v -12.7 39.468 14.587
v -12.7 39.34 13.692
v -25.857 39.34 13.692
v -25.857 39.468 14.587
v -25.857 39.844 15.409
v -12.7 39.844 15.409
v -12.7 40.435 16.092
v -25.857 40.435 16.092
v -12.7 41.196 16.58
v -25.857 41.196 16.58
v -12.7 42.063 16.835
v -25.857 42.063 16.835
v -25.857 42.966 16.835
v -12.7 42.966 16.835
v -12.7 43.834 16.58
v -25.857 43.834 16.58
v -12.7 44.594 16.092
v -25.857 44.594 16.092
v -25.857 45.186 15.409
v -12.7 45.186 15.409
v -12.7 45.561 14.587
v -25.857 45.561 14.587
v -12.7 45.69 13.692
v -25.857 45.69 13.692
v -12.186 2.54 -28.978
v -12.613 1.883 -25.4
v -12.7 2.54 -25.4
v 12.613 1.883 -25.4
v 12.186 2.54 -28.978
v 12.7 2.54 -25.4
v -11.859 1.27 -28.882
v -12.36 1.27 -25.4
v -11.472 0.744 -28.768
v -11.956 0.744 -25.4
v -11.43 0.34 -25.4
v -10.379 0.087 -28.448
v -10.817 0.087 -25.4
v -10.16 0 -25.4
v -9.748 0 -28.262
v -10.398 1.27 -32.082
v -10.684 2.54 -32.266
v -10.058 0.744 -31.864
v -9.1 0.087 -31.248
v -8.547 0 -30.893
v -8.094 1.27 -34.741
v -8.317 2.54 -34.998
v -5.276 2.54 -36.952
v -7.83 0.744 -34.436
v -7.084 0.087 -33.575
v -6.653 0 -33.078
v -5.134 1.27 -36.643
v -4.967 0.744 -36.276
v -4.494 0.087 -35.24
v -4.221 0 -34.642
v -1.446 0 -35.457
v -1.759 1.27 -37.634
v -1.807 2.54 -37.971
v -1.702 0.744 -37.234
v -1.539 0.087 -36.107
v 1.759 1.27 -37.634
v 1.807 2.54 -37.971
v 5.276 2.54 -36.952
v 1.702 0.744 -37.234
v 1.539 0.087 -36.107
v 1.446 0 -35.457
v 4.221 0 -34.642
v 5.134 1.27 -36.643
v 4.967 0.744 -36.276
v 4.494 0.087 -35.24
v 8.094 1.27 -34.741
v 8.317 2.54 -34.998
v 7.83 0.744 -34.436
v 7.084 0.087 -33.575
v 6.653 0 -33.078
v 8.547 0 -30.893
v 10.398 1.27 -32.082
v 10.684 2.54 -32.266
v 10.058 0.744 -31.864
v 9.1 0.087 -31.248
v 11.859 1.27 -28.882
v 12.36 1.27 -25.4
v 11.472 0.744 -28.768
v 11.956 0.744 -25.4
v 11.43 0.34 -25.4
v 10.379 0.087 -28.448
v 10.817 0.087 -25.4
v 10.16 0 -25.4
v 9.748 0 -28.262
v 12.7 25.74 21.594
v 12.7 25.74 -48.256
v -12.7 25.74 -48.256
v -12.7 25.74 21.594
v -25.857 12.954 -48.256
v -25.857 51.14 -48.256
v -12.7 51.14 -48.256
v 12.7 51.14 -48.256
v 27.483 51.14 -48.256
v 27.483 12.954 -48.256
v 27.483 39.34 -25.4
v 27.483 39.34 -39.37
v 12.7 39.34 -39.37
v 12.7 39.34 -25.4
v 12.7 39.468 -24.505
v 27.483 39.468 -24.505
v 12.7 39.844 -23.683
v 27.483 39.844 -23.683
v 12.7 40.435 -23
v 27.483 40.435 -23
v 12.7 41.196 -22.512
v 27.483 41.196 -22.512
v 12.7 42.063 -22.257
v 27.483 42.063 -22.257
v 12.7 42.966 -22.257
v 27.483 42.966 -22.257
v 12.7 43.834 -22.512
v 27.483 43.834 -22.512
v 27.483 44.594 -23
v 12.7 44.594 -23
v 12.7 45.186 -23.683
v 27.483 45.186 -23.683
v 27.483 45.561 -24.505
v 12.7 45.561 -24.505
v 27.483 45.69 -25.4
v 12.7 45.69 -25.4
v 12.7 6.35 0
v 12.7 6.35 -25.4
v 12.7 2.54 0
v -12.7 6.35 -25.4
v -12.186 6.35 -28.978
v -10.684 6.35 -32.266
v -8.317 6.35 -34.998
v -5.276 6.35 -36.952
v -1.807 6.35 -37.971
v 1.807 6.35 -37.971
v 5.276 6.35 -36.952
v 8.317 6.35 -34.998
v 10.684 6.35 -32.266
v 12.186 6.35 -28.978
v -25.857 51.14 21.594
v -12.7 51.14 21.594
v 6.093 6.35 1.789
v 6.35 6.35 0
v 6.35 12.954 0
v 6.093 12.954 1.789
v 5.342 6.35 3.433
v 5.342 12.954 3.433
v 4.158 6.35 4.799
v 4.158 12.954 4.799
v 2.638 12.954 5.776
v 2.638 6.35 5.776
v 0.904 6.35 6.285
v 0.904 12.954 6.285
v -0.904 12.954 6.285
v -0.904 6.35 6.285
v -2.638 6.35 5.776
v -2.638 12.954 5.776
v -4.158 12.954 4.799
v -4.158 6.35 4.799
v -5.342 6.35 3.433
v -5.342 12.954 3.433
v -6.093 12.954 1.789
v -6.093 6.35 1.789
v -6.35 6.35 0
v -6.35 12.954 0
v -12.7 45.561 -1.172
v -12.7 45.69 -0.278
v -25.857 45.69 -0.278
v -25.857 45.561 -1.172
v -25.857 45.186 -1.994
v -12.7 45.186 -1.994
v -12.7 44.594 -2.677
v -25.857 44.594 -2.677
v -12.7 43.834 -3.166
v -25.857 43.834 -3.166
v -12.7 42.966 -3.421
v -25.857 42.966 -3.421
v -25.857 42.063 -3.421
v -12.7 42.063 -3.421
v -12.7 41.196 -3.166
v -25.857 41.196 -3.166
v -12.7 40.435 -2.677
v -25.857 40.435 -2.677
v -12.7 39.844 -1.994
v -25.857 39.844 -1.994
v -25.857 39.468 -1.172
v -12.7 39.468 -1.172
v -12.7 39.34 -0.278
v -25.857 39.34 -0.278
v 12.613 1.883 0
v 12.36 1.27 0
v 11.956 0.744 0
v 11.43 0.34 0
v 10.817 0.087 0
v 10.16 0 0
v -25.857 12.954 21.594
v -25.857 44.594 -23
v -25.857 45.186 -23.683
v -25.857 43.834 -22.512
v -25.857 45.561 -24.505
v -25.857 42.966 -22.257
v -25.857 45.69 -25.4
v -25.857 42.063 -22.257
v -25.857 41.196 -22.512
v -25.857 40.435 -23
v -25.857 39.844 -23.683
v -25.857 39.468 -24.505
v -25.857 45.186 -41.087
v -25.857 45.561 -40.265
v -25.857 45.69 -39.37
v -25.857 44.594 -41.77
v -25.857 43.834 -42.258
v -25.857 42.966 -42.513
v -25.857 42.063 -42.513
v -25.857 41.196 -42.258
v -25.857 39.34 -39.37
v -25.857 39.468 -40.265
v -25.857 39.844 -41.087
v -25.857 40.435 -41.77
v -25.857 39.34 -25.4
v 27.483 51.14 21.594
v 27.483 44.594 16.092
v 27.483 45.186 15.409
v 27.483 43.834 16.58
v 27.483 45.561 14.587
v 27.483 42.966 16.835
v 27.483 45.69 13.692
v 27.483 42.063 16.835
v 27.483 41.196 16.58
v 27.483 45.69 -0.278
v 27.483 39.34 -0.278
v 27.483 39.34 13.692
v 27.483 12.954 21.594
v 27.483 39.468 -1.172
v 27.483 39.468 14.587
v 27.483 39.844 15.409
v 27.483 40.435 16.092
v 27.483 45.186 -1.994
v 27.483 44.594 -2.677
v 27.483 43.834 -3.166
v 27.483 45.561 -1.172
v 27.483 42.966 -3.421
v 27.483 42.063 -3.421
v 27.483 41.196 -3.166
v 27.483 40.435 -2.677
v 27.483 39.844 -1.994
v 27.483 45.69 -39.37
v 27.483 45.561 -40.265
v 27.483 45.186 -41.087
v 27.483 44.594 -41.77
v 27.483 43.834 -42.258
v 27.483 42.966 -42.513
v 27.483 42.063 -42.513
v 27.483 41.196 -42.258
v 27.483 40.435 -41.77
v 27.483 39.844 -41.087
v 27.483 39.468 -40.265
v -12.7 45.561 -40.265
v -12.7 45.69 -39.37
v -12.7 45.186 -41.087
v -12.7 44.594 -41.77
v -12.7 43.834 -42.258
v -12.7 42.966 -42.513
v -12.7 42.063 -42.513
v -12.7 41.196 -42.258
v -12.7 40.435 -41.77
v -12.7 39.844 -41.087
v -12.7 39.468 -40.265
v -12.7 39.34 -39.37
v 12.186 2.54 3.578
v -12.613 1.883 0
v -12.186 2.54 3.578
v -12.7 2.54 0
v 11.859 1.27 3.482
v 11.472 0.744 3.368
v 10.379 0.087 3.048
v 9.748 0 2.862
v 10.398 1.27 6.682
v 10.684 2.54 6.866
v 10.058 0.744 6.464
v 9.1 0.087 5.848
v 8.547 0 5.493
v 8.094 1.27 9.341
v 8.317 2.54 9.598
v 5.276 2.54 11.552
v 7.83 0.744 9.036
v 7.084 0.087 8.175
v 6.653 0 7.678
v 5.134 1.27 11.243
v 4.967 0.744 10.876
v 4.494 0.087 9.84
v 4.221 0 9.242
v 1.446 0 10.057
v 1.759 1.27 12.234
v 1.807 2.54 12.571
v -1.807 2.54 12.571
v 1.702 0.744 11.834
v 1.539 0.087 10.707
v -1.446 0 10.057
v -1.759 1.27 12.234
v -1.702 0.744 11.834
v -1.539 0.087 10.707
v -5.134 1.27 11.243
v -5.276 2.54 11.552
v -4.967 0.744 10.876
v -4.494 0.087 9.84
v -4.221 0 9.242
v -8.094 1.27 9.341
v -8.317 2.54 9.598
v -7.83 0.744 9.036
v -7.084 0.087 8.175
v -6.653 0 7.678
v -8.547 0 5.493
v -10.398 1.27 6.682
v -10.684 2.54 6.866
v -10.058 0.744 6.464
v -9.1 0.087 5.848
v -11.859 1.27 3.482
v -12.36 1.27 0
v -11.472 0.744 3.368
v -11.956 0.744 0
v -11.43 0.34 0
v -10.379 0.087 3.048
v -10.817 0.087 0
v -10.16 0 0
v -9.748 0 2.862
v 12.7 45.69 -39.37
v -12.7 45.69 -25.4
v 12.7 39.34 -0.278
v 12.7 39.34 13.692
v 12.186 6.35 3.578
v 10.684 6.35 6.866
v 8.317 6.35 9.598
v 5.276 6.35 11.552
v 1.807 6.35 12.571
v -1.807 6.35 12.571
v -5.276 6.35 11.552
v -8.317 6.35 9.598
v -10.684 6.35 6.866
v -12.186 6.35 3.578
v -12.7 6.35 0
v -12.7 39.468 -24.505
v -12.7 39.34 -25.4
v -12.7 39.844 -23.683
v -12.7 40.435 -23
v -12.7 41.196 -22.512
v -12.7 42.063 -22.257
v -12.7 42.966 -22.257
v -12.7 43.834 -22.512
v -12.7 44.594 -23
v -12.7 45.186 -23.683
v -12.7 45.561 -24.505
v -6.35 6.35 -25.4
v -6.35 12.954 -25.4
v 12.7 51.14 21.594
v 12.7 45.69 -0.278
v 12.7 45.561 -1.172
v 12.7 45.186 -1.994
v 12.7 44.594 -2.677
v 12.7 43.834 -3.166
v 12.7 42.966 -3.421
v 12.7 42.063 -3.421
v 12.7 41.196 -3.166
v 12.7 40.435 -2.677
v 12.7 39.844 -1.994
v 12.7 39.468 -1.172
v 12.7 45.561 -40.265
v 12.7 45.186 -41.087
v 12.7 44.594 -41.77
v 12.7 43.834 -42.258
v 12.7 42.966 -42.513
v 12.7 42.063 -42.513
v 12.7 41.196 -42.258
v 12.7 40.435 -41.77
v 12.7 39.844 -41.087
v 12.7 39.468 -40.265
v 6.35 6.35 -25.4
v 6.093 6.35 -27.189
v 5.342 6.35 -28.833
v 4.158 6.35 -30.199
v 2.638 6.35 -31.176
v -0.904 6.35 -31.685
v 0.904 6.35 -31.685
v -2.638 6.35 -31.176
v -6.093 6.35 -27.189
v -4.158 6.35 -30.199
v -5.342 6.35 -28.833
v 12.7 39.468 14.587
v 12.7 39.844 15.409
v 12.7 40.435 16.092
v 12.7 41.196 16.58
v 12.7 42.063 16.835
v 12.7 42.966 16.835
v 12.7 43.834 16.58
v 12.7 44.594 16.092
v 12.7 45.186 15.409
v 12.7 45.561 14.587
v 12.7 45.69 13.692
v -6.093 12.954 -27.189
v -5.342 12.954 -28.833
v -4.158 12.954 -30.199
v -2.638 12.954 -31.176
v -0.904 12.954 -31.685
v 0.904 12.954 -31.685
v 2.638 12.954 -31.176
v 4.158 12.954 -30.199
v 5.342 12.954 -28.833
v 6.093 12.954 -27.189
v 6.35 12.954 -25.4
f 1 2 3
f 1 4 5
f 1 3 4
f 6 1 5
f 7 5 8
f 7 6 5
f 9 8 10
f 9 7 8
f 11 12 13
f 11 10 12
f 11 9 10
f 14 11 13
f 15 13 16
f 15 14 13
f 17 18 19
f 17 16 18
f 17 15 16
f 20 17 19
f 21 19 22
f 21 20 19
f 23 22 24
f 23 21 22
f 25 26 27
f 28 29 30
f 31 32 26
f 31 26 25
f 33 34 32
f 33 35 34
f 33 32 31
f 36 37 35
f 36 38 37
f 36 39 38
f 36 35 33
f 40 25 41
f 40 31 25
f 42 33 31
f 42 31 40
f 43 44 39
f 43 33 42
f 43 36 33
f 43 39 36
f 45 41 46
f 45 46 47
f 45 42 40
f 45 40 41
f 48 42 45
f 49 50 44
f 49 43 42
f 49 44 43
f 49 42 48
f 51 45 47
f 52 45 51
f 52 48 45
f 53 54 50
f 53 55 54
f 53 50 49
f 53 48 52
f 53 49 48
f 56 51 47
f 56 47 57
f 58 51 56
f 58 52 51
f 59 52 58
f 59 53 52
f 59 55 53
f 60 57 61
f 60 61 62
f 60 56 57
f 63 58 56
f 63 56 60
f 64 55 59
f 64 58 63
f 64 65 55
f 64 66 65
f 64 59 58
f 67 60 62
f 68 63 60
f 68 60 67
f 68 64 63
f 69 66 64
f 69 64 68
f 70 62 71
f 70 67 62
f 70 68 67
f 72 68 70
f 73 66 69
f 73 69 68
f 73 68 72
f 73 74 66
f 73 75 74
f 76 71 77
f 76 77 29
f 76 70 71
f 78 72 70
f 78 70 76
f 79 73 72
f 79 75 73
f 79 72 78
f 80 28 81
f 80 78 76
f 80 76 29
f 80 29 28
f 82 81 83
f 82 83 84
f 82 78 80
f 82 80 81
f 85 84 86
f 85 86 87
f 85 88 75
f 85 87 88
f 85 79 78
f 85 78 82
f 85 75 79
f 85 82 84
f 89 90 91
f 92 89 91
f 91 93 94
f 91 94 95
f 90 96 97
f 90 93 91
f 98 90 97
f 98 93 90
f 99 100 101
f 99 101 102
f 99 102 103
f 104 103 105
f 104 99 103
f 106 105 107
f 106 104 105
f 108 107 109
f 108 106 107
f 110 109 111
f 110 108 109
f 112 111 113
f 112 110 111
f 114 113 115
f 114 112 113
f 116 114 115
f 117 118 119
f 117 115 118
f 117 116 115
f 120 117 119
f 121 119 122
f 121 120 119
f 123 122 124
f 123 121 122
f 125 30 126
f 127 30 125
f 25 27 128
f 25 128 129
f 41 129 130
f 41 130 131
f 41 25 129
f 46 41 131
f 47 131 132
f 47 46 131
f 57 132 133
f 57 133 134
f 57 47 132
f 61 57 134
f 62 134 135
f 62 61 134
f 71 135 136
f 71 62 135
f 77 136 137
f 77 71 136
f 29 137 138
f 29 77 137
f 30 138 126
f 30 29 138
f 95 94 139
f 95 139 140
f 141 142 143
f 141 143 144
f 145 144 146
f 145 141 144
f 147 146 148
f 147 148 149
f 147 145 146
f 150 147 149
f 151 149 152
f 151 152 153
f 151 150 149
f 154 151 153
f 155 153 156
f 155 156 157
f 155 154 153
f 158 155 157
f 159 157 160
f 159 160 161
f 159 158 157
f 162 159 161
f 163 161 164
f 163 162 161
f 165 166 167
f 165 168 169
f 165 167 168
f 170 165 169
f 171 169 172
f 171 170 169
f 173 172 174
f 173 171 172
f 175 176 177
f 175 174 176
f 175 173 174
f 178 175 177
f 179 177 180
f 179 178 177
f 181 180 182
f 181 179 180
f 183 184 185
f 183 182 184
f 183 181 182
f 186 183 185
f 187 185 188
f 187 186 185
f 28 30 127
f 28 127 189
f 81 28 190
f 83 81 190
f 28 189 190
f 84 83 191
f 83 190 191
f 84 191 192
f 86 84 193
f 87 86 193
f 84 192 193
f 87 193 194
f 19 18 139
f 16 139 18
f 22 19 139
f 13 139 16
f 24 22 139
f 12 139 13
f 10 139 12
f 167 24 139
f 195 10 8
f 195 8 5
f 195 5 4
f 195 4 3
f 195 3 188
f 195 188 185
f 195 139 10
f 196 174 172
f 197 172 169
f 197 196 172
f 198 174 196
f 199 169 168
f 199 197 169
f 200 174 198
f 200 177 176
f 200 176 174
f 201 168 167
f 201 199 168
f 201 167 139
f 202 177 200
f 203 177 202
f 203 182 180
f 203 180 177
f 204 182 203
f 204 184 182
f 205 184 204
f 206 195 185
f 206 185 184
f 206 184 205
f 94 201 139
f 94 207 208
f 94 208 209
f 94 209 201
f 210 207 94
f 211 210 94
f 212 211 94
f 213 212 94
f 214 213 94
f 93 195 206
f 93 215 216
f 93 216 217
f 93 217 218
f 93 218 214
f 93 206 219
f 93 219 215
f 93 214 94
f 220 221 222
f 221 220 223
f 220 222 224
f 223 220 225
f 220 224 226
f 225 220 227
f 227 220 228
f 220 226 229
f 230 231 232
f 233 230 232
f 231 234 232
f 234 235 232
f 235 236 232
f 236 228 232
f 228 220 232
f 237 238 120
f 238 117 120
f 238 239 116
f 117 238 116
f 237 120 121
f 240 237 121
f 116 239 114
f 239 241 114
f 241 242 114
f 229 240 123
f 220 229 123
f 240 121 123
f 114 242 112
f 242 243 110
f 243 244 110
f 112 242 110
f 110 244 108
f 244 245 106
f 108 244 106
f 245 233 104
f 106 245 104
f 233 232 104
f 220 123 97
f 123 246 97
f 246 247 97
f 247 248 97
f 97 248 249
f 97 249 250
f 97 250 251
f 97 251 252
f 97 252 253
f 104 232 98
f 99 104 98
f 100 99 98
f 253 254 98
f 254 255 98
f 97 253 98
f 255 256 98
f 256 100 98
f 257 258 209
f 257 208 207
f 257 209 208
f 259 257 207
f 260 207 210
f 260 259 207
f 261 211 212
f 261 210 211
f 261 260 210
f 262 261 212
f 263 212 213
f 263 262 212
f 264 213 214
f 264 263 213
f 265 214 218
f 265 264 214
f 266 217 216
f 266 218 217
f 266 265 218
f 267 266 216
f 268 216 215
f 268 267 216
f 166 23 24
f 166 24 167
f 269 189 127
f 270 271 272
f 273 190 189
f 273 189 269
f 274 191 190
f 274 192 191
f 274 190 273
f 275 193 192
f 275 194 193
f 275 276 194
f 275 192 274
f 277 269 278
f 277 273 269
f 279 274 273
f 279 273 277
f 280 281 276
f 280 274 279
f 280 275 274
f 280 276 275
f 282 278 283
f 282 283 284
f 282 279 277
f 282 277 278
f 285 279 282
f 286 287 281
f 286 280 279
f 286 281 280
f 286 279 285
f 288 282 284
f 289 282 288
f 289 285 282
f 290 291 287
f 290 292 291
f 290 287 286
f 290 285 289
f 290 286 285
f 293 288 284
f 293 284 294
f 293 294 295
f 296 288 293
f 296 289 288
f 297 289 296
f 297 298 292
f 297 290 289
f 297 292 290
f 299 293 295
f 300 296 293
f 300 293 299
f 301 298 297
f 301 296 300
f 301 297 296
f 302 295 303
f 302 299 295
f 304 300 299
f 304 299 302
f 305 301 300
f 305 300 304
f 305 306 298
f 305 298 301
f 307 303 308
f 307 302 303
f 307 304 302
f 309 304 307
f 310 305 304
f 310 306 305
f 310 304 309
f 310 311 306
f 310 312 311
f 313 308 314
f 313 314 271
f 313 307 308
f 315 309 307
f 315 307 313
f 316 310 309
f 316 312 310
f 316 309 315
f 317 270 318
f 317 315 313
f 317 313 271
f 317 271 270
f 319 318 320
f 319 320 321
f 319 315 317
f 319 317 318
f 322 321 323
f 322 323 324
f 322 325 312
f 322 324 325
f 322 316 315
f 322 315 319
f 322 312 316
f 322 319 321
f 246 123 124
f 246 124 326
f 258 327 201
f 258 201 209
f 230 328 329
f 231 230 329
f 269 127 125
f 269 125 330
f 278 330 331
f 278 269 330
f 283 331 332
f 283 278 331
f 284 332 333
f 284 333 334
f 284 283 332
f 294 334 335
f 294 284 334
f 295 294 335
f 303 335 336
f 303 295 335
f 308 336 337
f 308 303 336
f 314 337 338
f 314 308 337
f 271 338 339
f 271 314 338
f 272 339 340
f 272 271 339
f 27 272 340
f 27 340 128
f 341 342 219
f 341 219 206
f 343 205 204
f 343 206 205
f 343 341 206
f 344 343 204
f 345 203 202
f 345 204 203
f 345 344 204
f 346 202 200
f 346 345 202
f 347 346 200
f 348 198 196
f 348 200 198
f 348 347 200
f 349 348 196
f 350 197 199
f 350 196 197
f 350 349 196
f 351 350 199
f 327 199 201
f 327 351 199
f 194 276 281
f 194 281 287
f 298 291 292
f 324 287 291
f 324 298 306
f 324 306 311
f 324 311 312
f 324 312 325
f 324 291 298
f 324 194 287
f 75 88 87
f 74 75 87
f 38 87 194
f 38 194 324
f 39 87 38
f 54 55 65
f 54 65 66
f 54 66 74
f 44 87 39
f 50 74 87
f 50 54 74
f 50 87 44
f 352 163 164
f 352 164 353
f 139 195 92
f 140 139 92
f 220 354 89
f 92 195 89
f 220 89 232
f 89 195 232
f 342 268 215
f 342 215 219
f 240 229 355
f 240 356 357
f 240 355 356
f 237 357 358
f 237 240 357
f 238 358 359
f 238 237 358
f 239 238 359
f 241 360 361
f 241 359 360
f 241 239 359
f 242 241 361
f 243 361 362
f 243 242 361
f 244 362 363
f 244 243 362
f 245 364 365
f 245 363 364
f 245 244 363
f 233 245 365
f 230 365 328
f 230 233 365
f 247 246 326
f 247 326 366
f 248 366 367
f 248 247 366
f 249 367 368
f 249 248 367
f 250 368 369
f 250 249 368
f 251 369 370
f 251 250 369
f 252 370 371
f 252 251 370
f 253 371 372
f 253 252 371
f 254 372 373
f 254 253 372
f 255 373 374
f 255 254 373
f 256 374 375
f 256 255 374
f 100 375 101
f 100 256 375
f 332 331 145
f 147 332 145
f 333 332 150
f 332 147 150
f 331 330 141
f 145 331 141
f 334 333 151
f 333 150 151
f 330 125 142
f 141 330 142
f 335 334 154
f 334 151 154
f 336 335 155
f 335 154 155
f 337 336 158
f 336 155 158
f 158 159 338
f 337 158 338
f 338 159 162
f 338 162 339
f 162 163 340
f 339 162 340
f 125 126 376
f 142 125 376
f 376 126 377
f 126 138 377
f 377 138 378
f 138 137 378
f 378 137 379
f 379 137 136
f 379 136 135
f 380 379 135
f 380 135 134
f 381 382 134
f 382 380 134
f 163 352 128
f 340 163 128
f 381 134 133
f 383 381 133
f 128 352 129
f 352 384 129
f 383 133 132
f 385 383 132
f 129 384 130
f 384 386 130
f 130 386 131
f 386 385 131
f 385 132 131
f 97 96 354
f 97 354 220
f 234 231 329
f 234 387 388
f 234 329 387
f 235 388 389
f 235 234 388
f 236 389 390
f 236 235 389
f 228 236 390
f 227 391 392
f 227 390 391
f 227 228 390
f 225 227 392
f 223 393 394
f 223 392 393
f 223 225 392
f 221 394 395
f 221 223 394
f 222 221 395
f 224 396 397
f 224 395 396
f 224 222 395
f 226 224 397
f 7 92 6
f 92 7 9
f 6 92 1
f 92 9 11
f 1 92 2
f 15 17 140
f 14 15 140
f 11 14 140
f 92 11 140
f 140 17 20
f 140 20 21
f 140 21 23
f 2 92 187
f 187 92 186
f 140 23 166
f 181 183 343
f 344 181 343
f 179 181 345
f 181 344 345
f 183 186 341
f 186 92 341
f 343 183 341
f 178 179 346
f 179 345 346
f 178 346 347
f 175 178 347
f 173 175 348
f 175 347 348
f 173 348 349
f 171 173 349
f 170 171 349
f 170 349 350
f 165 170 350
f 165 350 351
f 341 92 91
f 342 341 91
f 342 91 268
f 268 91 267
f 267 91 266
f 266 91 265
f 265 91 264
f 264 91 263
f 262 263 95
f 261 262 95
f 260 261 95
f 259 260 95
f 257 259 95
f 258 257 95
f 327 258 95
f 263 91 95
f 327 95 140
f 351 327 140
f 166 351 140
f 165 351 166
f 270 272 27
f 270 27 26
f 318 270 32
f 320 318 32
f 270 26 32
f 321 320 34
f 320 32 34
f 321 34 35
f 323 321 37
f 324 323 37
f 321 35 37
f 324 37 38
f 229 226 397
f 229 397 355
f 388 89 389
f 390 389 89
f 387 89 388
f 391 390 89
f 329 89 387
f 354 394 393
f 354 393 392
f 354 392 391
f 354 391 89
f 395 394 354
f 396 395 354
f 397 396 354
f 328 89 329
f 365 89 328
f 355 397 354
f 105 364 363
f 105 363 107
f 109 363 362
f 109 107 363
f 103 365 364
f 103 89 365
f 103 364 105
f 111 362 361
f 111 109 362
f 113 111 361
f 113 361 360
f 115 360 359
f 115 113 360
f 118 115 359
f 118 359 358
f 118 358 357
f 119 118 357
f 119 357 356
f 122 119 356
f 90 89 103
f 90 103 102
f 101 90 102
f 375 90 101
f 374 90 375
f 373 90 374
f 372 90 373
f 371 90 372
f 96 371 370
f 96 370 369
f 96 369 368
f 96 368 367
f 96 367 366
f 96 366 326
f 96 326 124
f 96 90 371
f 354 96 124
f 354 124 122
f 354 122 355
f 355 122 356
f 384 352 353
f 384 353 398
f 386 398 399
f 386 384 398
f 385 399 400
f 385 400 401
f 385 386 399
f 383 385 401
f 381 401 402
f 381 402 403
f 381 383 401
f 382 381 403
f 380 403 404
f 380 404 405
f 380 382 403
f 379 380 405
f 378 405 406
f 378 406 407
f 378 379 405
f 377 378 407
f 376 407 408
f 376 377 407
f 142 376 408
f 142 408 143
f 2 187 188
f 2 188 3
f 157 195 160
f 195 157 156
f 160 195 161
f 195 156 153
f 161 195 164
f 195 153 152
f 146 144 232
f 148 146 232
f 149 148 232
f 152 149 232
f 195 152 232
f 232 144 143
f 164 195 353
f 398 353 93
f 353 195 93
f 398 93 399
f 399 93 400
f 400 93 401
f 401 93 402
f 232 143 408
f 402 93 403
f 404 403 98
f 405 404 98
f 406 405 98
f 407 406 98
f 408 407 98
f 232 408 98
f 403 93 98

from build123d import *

# Parameters (mm, degrees)
BOSS_EXTRUDE1_DEPTH = 6.35
BOSS_EXTRUDE2_DEPTH = 6.604
SKETCH3_W           = 53.34
SKETCH3_H           = 69.85
BOSS_EXTRUDE3_DEPTH = 38.185673152
FILLET1_R           = 2.54
SKETCH4_W           = 25.4
SKETCH4_H           = 25.4
CUT_EXTRUDE1_DEPTH  = 70.358
CUT_EXTRUDE2_DEPTH  = 89.255701154


with BuildPart() as part:
    # Sketch1 → Boss-Extrude1 (new body)
    with BuildSketch(Plane(origin=(0, 0, 0), x_dir=(1, 0, 0), z_dir=(0, 1, 0))):
        with BuildLine():
            Line((-12.7, 0), (-12.7, 25.4))
            ThreePointArc((-12.7, 25.4), (0, 38.1), (12.7, 25.4))
            Line((12.7, 25.4), (12.7, 0))
            ThreePointArc((12.7, 0), (0, -12.7), (-12.7, 0))
        make_face()
    extrude(amount=BOSS_EXTRUDE1_DEPTH)

    # Sketch2 → Boss-Extrude2 (add)
    with BuildSketch(Plane(origin=(0, 6.35, 0), x_dir=(1, 0, 0), z_dir=(0, 1, 0))):
        with BuildLine():
            Line((-6.35, 0), (-6.35, 25.4))
            ThreePointArc((-6.35, 25.4), (0, 31.75), (6.35, 25.4))
            Line((6.35, 25.4), (6.35, 0))
            ThreePointArc((6.35, 0), (0, -6.35), (-6.35, 0))
        make_face()
    extrude(amount=BOSS_EXTRUDE2_DEPTH)

    # Sketch3 → Boss-Extrude3 (add)
    with BuildSketch(Plane(origin=(0, 12.954, 0), x_dir=(1, 0, 0), z_dir=(0, 1, 0))):
        with Locations((0.81256739, 13.33105678)):
            Rectangle(SKETCH3_W, SKETCH3_H)
    extrude(amount=BOSS_EXTRUDE3_DEPTH)

    # Fillet1
    fillet1_edges = [part.edges().sort_by_distance(p)[0] for p in [
        (-12.7, 0, -12.7),
        (0, 0, -38.1),
        (12.7, 0, -12.7),
        (0, 0, 12.7),
    ]]
    fillet(fillet1_edges, radius=FILLET1_R)

    # Sketch4 → Cut-Extrude1 (cut)
    with BuildSketch(Plane(origin=(0, 0, -48.25605678), x_dir=(-1, 0, 0), z_dir=(0, 0, -1))):
        with Locations((0, 38.439673152)):
            Rectangle(SKETCH4_W, SKETCH4_H)
    extrude(amount=-CUT_EXTRUDE1_DEPTH, mode=Mode.SUBTRACT)

    # Sketch5 → Cut-Extrude2 (cut, through all)
    with BuildSketch(Plane(origin=(27.48256739, 0, 0), x_dir=(0, 0, -1), z_dir=(1, 0, 0))):
        with BuildLine():
            Line((0.277921972, 39.339563333), (-13.692078028, 39.339563333))
            ThreePointArc((-13.692078028, 39.339563333), (-16.867078028, 42.514563333), (-13.692078028, 45.689563333))
            Line((-13.692078028, 45.689563333), (0.277921972, 45.689563333))
            ThreePointArc((0.277921972, 45.689563333), (3.452921972, 42.514563333), (0.277921972, 39.339563333))
        make_face()
        with BuildLine():
            Line((25.4, 45.689563333), (39.37, 45.689563333))
            ThreePointArc((39.37, 45.689563333), (42.545, 42.514563333), (39.37, 39.339563333))
            Line((39.37, 39.339563333), (25.4, 39.339563333))
            ThreePointArc((25.4, 39.339563333), (22.225, 42.514563333), (25.4, 45.689563333))
        make_face()
    extrude(amount=-CUT_EXTRUDE2_DEPTH, mode=Mode.SUBTRACT)


solid = part.part
